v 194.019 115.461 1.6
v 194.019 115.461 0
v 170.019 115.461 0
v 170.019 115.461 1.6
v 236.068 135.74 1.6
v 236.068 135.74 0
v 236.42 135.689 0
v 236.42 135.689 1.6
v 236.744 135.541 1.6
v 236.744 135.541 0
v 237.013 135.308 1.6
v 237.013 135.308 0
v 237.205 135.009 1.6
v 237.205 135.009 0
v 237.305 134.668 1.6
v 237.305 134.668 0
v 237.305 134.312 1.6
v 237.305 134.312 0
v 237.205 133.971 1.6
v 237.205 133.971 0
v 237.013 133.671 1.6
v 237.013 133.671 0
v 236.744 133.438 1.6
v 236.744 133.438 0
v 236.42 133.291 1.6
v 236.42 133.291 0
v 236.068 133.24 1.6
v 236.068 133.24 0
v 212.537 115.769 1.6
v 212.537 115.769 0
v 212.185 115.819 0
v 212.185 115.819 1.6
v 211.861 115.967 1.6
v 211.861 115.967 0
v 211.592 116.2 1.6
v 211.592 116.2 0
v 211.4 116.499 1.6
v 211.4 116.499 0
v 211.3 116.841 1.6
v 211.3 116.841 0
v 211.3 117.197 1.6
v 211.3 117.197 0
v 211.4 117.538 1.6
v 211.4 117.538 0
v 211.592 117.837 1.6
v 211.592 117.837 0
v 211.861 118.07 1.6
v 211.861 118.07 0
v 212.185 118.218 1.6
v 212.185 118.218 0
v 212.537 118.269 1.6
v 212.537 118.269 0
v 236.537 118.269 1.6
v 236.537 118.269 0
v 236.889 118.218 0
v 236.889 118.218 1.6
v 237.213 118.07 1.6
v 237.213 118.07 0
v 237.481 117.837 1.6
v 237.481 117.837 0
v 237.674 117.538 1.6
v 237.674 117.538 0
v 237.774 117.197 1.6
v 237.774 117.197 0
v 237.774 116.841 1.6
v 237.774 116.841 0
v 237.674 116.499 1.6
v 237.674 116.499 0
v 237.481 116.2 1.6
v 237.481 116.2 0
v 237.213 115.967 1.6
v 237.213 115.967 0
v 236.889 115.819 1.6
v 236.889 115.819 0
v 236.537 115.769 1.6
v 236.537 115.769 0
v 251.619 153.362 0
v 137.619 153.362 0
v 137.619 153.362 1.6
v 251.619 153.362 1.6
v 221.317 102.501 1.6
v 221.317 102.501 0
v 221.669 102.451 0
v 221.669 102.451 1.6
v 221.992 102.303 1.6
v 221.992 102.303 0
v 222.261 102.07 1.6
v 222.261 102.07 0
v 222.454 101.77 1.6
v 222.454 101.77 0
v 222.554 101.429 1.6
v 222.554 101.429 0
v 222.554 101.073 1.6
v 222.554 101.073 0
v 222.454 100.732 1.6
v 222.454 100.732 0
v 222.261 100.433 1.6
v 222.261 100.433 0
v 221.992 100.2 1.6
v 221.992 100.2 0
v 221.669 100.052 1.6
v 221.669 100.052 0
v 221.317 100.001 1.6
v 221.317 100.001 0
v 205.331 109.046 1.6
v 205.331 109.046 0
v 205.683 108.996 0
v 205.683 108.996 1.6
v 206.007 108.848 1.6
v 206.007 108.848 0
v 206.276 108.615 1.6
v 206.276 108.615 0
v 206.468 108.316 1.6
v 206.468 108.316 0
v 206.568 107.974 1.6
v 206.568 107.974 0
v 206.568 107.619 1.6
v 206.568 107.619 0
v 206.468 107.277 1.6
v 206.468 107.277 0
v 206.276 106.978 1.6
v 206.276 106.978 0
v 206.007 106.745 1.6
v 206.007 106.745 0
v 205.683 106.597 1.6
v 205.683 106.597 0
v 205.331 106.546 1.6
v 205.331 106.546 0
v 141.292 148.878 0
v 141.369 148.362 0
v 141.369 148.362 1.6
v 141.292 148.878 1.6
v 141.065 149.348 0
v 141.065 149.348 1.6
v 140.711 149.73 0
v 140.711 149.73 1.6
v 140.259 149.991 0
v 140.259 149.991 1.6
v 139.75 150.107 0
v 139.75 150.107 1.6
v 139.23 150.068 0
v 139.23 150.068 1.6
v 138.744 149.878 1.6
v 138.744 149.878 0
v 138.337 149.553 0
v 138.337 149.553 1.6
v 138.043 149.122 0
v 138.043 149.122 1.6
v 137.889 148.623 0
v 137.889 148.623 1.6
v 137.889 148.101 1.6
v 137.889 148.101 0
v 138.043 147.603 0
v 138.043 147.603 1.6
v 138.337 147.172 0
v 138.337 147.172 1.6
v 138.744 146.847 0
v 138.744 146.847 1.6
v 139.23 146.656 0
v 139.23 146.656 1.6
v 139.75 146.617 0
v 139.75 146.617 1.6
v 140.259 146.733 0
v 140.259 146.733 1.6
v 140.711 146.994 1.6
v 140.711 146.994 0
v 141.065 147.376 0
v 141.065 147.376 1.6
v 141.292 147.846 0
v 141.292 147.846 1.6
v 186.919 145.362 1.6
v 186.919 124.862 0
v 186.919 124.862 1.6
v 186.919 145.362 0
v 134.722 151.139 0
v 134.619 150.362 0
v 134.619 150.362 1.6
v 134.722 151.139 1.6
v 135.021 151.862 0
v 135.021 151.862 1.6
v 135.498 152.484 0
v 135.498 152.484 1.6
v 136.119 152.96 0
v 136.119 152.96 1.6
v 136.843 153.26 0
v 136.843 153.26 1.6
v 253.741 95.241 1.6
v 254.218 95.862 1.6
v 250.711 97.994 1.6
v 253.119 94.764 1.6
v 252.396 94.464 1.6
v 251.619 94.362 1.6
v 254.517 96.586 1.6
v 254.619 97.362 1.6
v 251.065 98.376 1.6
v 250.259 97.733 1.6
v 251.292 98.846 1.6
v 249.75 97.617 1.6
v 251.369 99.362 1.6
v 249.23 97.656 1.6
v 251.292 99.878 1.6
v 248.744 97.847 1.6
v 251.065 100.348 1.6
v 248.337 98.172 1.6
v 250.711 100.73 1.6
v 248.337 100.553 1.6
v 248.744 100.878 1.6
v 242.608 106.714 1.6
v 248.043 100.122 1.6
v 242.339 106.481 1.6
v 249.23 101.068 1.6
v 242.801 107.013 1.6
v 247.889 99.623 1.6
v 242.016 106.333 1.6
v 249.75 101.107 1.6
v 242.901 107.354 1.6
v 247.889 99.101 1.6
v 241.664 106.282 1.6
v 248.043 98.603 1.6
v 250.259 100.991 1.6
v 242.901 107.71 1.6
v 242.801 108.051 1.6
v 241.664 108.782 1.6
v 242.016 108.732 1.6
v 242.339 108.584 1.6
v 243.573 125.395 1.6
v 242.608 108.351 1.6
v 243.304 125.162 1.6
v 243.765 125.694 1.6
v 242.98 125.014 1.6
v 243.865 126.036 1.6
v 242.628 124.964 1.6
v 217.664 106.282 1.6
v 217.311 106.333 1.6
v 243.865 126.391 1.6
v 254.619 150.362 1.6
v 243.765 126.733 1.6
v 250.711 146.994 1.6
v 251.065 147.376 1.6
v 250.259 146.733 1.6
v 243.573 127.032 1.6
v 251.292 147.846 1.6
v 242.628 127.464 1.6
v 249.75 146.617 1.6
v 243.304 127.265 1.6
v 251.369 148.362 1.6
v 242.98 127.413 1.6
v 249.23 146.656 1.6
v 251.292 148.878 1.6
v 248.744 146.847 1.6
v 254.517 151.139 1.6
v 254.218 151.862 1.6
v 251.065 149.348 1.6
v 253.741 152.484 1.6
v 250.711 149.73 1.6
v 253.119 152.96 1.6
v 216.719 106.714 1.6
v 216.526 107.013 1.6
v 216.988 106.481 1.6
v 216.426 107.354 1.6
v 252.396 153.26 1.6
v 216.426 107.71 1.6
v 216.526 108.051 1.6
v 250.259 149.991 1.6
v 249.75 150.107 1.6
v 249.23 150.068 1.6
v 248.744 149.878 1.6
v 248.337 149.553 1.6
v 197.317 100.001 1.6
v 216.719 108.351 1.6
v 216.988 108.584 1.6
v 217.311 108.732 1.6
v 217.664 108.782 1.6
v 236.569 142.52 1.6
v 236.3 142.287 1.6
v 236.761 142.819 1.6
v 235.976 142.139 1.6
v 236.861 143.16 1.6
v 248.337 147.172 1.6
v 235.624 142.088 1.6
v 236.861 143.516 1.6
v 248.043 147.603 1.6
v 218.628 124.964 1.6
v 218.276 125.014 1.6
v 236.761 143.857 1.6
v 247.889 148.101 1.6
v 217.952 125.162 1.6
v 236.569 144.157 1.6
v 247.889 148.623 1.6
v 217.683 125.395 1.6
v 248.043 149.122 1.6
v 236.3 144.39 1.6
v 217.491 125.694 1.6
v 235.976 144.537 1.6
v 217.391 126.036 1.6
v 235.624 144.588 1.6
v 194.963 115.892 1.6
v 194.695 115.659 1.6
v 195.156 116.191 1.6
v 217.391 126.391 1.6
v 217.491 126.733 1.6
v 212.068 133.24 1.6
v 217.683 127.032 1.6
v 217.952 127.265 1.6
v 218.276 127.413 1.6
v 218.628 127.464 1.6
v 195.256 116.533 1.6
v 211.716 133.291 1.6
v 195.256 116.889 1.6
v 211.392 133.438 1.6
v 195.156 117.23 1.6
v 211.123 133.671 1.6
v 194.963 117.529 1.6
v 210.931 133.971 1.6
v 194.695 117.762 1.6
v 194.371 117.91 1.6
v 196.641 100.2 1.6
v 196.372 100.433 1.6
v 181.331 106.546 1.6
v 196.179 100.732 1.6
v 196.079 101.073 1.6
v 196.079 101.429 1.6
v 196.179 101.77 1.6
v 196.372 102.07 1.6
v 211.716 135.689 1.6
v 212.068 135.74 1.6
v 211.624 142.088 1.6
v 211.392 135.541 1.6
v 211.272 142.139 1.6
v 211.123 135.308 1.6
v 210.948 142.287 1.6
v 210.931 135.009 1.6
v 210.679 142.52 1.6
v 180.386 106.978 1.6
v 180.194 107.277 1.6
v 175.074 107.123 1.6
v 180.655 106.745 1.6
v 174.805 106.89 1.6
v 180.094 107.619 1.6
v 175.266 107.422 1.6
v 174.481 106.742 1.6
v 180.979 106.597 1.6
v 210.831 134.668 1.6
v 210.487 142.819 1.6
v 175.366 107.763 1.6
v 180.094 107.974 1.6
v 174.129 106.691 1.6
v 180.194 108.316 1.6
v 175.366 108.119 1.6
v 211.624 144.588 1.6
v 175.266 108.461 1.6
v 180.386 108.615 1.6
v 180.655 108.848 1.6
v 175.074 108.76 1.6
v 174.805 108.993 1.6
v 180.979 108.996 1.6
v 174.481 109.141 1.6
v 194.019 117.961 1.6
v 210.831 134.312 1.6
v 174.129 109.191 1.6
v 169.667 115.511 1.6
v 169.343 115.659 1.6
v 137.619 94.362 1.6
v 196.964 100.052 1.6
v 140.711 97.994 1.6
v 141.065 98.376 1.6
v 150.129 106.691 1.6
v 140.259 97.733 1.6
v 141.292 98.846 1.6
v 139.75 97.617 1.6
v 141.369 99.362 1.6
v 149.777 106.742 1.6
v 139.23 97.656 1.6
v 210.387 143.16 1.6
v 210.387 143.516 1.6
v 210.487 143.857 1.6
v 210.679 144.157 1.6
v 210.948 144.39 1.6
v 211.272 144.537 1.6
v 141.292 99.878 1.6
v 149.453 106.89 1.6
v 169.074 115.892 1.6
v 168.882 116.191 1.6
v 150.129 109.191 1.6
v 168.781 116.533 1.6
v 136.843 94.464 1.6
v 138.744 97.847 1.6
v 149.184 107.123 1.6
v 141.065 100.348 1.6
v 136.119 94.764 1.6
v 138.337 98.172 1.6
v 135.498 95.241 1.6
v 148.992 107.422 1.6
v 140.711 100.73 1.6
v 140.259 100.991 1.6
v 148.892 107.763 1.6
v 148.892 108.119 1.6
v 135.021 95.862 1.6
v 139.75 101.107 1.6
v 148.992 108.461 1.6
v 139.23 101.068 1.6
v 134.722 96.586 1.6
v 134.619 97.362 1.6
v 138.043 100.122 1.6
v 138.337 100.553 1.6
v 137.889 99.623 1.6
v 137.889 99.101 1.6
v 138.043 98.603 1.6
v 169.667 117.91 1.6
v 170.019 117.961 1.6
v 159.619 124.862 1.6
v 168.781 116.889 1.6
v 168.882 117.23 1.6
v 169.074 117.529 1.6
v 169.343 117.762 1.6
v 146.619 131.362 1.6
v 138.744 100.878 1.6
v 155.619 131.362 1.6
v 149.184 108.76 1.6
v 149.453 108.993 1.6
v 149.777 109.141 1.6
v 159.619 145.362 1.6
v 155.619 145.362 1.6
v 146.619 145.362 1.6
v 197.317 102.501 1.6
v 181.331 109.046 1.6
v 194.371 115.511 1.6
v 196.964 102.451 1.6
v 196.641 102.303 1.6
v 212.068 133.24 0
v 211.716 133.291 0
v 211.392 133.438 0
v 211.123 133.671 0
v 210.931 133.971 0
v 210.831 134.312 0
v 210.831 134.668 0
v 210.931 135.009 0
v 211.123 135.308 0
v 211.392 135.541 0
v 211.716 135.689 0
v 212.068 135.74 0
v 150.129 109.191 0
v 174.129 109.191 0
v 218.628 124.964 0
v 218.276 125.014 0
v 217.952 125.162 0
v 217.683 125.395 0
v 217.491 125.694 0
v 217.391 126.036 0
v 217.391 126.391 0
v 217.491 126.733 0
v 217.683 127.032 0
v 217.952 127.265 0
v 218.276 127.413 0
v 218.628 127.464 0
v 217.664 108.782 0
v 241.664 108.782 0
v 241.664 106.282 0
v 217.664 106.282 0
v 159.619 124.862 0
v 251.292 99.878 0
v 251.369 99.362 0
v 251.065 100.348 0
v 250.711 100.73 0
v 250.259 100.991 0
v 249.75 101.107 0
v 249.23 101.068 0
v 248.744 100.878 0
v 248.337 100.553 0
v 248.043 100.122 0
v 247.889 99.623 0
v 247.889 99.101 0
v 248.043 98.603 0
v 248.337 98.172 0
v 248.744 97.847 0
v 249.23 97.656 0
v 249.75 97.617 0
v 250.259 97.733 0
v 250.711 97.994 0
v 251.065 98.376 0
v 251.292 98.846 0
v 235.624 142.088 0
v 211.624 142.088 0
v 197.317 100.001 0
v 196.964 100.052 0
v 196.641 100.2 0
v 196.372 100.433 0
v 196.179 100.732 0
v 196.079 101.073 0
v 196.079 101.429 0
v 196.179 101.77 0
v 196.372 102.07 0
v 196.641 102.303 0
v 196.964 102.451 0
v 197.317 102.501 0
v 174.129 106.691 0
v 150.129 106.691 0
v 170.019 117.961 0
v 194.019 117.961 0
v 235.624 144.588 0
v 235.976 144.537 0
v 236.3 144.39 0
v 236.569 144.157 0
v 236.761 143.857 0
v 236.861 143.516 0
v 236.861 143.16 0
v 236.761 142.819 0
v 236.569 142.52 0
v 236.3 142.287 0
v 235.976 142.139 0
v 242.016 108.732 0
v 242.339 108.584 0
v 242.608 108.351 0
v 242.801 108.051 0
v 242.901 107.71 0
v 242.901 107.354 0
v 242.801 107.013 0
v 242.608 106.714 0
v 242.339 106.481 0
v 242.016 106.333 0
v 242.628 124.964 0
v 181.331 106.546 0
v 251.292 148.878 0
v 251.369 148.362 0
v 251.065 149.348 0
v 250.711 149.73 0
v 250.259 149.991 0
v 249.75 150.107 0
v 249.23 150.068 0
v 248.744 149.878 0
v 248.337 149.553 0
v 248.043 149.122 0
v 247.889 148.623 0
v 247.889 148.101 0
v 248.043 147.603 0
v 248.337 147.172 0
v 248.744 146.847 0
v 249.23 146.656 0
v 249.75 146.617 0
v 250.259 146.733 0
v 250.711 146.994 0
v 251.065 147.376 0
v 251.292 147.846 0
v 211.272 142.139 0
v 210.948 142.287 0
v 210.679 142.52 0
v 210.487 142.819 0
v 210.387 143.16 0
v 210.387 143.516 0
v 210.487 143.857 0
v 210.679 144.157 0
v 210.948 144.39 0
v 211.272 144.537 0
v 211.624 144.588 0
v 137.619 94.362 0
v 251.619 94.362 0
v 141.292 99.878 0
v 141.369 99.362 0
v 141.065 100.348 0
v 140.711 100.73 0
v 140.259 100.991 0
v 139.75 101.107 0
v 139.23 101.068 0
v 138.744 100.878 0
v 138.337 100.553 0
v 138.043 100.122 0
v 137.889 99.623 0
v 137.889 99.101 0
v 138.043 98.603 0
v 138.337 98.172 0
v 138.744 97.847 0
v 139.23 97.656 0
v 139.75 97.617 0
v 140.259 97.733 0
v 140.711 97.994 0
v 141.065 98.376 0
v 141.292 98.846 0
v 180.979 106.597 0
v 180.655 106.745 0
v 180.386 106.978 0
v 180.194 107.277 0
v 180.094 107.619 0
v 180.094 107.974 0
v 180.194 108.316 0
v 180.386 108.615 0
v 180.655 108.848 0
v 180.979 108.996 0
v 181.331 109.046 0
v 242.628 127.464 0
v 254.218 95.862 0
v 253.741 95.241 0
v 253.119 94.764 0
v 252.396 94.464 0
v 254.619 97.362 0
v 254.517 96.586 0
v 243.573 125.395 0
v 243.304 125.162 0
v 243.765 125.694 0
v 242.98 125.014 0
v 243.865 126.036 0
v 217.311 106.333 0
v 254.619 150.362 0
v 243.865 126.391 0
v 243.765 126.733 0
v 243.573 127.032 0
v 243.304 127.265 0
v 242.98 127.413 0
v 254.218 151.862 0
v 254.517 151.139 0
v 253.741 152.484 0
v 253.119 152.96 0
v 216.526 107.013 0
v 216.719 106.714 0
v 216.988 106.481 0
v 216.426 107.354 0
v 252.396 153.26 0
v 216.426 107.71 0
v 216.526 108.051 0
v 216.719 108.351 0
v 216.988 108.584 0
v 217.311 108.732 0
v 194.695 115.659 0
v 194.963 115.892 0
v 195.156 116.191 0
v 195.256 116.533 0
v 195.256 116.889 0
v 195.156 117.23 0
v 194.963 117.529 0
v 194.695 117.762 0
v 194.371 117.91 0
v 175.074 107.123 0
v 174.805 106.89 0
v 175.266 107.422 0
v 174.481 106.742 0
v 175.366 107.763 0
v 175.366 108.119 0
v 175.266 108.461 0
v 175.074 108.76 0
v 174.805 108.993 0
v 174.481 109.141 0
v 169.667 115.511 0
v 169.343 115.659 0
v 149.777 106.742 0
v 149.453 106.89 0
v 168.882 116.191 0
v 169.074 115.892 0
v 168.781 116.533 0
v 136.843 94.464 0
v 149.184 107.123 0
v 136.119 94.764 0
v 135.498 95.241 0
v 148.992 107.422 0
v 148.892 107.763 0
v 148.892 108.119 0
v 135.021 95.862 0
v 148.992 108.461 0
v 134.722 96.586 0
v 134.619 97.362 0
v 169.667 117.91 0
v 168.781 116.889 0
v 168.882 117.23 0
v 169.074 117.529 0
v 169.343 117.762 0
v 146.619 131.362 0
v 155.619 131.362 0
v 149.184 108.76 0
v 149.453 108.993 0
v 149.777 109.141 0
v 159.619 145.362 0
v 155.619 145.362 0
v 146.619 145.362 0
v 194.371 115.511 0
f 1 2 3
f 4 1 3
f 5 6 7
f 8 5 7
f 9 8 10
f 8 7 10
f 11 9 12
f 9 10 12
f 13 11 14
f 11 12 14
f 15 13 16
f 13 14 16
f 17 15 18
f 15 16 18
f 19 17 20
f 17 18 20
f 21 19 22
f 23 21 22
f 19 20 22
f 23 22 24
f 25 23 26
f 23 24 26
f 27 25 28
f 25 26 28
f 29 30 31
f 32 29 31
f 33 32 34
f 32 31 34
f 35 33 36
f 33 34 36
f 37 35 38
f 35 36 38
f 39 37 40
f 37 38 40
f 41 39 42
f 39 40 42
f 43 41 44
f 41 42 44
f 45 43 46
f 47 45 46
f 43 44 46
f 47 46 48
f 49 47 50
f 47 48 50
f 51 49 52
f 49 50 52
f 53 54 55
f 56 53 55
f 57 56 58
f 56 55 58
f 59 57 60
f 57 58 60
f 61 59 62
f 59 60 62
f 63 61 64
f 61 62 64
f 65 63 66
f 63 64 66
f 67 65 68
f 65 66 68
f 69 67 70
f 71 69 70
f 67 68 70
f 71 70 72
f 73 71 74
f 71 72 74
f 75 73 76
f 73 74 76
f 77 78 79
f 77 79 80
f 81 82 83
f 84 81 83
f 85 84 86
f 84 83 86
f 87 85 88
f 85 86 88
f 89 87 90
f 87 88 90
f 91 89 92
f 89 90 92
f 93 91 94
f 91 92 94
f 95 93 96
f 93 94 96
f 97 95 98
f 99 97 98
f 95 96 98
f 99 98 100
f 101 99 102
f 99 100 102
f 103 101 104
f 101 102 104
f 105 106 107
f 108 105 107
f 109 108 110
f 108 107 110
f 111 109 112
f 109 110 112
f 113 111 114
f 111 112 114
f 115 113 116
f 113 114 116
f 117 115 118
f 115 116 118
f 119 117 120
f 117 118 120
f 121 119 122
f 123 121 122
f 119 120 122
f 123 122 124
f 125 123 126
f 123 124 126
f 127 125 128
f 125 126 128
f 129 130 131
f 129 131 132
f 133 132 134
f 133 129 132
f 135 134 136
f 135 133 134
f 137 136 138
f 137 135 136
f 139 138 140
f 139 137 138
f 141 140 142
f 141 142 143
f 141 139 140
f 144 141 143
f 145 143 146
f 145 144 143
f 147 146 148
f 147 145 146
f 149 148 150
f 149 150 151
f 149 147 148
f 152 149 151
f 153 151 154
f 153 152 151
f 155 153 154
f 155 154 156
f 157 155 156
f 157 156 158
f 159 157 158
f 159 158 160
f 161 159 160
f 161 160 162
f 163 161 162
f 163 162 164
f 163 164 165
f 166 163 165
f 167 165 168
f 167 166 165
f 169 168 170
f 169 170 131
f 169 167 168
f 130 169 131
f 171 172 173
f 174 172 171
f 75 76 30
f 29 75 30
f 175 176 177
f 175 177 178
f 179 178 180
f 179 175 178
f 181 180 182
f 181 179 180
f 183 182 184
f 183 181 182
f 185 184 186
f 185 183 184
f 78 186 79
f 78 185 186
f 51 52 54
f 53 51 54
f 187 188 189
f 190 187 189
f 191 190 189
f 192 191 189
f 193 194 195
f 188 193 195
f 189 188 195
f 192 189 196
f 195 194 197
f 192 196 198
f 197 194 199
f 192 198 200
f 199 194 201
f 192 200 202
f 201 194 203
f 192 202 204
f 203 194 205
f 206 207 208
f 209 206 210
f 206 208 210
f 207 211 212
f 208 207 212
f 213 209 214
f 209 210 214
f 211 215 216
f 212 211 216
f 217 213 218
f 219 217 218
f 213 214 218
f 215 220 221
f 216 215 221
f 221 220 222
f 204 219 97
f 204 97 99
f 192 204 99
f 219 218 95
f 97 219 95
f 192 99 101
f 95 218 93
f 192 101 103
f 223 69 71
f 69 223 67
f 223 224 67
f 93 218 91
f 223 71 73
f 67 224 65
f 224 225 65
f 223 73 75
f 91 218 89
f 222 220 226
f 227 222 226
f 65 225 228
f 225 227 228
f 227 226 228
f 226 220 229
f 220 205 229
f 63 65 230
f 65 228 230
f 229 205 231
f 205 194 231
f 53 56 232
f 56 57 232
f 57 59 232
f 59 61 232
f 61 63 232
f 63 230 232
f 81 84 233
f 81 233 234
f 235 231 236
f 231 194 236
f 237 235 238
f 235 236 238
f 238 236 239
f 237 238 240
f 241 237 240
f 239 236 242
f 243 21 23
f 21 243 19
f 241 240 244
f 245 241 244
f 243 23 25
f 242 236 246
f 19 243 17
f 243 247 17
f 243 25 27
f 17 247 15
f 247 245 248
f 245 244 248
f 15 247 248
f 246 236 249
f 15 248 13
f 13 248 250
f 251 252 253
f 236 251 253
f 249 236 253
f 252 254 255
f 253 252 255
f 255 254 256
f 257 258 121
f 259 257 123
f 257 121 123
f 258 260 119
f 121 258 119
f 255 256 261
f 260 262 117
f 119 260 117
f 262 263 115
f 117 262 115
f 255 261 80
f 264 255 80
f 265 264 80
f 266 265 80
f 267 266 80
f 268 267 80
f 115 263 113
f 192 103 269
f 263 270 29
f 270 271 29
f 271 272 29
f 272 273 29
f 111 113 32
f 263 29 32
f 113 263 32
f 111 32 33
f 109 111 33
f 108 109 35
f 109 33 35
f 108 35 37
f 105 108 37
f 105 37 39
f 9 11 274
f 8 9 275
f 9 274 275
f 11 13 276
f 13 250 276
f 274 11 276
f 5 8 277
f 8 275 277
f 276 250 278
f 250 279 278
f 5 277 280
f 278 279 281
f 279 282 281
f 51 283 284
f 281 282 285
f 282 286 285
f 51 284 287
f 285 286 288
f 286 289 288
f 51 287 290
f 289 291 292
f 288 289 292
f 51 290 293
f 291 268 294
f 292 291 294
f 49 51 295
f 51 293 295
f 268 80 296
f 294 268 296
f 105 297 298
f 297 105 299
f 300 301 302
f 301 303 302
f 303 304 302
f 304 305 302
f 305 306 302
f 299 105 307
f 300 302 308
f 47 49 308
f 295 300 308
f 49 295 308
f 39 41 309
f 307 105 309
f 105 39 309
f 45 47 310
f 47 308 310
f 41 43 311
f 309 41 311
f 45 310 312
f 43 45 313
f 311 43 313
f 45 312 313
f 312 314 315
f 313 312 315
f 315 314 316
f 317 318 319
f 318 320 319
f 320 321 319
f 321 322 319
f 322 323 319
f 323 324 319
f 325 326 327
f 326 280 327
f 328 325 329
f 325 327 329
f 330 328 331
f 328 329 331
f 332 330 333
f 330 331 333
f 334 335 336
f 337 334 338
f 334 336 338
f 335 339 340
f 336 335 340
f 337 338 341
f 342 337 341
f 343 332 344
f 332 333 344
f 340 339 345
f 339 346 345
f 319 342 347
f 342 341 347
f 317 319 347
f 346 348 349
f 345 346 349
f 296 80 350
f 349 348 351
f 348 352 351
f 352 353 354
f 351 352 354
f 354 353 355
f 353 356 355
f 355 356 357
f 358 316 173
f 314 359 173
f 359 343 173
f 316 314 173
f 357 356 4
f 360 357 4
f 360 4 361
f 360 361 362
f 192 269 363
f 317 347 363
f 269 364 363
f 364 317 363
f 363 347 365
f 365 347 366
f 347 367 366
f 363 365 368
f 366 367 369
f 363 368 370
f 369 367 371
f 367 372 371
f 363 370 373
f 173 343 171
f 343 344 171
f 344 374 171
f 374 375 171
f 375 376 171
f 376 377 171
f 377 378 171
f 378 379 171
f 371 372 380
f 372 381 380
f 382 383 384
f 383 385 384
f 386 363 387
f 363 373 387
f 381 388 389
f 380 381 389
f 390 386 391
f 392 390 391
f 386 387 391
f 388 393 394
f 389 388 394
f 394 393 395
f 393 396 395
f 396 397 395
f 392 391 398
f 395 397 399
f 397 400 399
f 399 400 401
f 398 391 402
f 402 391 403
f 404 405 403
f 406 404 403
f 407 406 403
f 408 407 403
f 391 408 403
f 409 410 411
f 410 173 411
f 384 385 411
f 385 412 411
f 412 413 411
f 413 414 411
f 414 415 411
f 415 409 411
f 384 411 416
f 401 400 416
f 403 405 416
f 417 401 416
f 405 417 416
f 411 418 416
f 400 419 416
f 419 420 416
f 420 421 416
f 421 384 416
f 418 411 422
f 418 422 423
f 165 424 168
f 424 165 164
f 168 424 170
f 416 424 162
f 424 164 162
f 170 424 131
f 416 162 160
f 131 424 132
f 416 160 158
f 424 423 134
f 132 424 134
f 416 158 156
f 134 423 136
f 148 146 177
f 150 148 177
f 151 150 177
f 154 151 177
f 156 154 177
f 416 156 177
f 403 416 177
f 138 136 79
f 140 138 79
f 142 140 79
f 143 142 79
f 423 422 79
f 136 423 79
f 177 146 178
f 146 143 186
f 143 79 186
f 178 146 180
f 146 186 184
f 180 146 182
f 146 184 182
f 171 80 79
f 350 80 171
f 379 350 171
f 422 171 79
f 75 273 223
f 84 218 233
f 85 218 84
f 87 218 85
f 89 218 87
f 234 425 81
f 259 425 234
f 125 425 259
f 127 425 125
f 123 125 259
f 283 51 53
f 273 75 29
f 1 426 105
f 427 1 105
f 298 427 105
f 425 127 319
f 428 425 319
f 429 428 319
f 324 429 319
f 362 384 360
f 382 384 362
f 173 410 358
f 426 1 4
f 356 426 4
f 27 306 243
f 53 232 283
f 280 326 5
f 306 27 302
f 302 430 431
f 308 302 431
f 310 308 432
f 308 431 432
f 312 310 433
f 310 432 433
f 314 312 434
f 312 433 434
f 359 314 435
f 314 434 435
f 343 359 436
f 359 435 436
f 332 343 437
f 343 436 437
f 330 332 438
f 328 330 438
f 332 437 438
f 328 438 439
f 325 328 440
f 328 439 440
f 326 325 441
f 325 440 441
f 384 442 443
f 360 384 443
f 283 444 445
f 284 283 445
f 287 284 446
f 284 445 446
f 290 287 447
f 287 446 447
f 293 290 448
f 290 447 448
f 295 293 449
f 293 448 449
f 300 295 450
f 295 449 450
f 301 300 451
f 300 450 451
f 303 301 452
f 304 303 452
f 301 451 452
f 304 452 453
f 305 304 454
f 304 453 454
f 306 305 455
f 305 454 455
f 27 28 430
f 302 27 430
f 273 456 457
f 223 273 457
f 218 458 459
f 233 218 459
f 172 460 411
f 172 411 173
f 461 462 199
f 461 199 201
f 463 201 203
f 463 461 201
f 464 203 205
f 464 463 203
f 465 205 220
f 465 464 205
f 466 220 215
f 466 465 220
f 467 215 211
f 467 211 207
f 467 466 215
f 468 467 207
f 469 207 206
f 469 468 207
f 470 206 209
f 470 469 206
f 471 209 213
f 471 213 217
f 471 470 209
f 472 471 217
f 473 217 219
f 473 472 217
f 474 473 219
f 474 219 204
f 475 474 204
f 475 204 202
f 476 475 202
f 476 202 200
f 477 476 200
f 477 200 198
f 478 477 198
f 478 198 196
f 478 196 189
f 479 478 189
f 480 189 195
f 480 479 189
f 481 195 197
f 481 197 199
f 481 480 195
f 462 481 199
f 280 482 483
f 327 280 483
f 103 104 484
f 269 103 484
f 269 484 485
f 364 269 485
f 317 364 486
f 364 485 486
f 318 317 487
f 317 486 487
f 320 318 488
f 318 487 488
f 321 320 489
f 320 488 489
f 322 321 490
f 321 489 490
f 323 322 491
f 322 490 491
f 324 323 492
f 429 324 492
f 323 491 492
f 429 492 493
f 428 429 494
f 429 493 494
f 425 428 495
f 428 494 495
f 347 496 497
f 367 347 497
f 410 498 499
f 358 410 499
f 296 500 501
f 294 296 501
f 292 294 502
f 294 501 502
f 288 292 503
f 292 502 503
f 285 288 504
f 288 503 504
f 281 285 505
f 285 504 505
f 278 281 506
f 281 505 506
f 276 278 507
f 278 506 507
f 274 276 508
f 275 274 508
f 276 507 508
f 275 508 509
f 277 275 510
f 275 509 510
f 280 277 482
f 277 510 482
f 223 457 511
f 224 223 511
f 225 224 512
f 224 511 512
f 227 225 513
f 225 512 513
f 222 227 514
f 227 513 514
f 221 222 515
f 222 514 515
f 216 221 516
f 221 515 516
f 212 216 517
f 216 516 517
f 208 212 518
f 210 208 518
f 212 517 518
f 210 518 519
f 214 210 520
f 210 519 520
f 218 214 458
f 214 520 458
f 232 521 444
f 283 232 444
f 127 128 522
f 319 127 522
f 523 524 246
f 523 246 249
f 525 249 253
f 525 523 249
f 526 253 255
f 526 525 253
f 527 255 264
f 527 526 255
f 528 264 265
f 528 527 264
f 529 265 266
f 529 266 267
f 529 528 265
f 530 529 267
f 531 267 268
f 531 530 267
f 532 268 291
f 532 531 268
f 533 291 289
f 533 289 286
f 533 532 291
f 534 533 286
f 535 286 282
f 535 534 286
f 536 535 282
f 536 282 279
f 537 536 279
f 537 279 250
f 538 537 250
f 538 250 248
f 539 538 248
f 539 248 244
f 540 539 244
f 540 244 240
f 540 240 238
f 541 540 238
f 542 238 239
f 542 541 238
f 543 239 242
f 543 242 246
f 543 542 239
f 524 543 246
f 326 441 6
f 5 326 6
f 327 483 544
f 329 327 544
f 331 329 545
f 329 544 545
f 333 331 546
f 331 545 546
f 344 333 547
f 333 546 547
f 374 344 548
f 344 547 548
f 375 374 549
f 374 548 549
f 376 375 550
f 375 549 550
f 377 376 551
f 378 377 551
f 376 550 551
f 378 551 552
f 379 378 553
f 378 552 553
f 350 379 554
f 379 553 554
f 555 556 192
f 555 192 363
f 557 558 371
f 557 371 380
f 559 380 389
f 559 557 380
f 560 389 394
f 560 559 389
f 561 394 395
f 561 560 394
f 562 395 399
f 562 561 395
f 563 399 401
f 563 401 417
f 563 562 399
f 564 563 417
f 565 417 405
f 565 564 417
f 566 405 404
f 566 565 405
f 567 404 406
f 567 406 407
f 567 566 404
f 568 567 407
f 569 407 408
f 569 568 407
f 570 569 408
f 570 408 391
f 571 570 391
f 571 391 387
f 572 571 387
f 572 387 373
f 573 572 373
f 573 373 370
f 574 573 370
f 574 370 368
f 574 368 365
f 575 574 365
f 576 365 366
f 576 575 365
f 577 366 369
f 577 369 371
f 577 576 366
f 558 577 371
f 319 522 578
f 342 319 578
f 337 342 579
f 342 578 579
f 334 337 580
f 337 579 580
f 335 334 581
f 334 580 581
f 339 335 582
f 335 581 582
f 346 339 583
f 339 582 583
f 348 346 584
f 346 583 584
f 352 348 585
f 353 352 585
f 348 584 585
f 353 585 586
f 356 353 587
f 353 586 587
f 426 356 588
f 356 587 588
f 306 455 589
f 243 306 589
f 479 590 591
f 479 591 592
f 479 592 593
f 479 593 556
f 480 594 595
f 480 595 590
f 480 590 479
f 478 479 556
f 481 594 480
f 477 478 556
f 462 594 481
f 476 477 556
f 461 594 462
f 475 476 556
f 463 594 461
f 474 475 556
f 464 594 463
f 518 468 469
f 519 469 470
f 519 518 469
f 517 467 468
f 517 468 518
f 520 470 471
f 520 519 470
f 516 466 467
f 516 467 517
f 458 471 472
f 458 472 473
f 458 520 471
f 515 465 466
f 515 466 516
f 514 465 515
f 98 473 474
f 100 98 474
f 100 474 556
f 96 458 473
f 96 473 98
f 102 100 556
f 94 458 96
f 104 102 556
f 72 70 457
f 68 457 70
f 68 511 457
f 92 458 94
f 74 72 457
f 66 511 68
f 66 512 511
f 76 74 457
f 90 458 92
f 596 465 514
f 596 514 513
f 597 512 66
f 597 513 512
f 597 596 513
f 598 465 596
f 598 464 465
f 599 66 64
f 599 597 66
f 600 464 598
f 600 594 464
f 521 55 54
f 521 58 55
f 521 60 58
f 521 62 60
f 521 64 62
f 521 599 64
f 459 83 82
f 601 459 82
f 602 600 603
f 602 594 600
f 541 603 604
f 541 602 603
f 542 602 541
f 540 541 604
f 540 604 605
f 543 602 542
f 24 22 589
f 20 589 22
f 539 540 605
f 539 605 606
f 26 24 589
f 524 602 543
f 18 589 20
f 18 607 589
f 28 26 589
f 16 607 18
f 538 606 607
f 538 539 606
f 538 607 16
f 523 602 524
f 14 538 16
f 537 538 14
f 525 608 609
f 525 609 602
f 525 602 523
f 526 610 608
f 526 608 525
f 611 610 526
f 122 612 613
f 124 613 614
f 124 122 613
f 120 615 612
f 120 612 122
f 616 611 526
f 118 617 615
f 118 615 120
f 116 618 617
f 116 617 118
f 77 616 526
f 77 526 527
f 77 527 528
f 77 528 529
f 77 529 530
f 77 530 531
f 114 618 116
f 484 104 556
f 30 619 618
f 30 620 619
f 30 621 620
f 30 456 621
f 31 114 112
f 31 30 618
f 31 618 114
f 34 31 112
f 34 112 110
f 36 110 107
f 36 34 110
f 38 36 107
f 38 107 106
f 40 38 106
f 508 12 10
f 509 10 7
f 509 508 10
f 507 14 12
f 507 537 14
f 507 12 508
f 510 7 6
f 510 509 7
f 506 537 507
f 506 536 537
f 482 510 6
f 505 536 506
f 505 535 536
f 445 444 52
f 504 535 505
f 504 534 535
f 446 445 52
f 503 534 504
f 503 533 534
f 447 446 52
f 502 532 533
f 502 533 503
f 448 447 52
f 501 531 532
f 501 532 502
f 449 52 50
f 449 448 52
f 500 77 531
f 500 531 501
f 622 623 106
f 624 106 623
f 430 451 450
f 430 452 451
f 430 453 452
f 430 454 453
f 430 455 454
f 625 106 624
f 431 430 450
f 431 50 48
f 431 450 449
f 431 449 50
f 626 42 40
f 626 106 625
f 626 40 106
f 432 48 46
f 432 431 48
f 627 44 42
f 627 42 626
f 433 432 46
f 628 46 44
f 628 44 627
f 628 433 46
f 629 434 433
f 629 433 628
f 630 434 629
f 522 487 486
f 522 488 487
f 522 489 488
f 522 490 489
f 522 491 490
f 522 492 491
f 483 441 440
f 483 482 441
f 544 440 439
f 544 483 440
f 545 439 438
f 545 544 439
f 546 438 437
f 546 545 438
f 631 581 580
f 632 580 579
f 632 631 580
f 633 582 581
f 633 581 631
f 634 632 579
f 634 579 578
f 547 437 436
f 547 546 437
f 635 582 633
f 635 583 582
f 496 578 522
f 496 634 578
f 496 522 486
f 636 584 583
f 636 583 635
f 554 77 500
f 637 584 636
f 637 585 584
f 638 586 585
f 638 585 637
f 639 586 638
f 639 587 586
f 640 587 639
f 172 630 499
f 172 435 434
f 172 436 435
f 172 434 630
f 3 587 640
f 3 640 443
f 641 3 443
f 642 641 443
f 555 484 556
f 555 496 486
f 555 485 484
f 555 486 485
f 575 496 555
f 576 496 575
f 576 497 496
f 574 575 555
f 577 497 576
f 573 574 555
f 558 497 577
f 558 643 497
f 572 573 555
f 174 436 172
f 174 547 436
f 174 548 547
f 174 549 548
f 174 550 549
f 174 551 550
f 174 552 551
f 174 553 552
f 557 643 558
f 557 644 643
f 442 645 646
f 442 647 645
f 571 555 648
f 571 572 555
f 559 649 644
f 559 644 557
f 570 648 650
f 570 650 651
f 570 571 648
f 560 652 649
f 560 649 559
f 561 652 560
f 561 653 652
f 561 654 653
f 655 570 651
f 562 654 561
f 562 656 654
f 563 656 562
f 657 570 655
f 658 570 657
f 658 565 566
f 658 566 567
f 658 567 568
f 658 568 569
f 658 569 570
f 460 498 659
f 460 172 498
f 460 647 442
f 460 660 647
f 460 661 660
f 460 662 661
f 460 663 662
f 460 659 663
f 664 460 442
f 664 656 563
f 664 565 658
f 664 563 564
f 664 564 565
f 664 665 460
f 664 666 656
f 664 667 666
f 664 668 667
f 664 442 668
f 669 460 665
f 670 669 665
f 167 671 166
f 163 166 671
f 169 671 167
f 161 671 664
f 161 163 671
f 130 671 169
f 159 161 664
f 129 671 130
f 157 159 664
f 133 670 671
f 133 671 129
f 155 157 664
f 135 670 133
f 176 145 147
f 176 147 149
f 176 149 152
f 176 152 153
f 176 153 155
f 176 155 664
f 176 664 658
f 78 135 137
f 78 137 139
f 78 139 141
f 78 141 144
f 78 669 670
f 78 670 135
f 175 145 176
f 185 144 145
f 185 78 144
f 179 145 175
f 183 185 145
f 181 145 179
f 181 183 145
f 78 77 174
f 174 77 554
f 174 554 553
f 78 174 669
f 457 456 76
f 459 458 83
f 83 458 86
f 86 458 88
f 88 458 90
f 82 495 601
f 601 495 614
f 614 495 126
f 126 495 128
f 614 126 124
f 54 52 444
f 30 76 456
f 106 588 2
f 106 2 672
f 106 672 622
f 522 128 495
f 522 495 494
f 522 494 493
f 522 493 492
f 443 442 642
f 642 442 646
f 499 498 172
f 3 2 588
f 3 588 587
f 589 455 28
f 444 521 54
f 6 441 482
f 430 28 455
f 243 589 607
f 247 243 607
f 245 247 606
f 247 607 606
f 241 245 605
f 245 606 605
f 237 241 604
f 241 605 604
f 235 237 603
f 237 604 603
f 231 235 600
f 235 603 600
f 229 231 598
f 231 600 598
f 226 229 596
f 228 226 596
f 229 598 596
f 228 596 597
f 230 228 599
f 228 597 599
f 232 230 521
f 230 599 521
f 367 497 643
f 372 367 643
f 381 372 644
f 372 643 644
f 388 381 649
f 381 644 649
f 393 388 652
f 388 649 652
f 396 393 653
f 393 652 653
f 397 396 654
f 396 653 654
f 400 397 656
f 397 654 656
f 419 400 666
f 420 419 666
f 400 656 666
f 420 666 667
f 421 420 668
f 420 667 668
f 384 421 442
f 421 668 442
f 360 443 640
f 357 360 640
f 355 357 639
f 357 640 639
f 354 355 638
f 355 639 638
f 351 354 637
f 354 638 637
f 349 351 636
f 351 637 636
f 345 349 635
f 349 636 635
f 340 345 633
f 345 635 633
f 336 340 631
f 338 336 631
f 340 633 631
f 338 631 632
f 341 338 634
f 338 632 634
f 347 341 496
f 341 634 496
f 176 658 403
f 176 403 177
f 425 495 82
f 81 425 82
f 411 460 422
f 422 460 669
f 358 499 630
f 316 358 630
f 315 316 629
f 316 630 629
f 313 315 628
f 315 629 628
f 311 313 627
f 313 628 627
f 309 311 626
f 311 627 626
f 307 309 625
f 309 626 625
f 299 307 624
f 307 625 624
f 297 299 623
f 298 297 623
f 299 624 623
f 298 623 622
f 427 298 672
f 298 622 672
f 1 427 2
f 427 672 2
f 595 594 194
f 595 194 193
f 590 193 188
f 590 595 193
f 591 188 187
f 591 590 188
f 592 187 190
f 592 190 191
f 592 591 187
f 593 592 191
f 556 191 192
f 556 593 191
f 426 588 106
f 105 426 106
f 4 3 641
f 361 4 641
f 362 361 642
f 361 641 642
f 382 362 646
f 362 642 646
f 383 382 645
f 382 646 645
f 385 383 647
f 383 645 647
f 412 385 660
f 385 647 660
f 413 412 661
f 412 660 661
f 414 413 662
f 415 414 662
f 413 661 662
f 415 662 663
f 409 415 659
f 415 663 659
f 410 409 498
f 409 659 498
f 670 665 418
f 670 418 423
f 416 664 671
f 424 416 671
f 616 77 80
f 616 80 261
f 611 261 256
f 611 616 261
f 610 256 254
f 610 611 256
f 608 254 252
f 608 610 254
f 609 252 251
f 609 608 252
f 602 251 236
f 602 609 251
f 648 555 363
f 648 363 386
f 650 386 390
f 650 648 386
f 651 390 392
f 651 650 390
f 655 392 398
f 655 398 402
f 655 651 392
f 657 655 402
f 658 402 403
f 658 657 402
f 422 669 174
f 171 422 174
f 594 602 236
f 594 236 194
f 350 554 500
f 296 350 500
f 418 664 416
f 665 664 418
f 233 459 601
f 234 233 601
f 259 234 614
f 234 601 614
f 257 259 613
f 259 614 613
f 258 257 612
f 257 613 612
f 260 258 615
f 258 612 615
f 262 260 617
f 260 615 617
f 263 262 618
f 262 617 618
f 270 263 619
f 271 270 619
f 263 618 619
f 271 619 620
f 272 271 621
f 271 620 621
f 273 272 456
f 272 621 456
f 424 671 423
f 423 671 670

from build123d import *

# Parameters (mm, degrees)
SKETCH_2_R      = 1.75
SKETCH_2_W      = 27.3
SKETCH_2_H      = 20.5
SKETCH_2_W_2    = 9
SKETCH_2_H_2    = 14
EXTRUDE_1_DEPTH = 1.6


with BuildPart() as part:
    # 草图2 → 凸台-拉伸1 (new body)
    with BuildSketch(Plane.XY):
        with BuildLine():
            Line((137.6194709, 153.362234659), (251.6194709, 153.362234659))
            ThreePointArc((251.6194709, 153.362234659), (253.740791244, 152.483555002), (254.6194709, 150.362234659))
            Line((254.6194709, 150.362234659), (254.6194709, 97.362234659))
            ThreePointArc((254.6194709, 97.362234659), (253.740791244, 95.240914315), (251.6194709, 94.362234659))
            Line((251.6194709, 94.362234659), (137.6194709, 94.362234659))
            ThreePointArc((137.6194709, 94.362234659), (135.498150556, 95.240914315), (134.6194709, 97.362234659))
            Line((134.6194709, 97.362234659), (134.6194709, 150.362234659))
            ThreePointArc((134.6194709, 150.362234659), (135.498150556, 152.483555002), (137.6194709, 153.362234659))
        make_face()
        with Locations((139.6194709, 99.362234659)):
            Circle(SKETCH_2_R, mode=Mode.SUBTRACT)
        with Locations((249.6194709, 99.362234659)):
            Circle(SKETCH_2_R, mode=Mode.SUBTRACT)
        with Locations((249.6194709, 148.362234659)):
            Circle(SKETCH_2_R, mode=Mode.SUBTRACT)
        with Locations((139.6194709, 148.362234659)):
            Circle(SKETCH_2_R, mode=Mode.SUBTRACT)
        with Locations((173.2694709, 135.112234659)):
            Rectangle(SKETCH_2_W, SKETCH_2_H, mode=Mode.SUBTRACT)
        with BuildLine():
            Line((211.624069471, 144.588100568), (235.624069471, 144.588100568))
            ThreePointArc((235.624069471, 144.588100568), (236.874069471, 143.338100568), (235.624069471, 142.088100568))
            Line((235.624069471, 142.088100568), (211.624069471, 142.088100568))
            ThreePointArc((211.624069471, 142.088100568), (210.374069471, 143.338100568), (211.624069471, 144.588100568))
        make_face(mode=Mode.SUBTRACT)
        with BuildLine():
            Line((212.067868177, 135.739898553), (236.067868177, 135.739898553))
            ThreePointArc((236.067868177, 135.739898553), (237.317868177, 134.489898553), (236.067868177, 133.239898553))
            Line((236.067868177, 133.239898553), (212.067868177, 133.239898553))
            ThreePointArc((212.067868177, 133.239898553), (210.817868177, 134.489898553), (212.067868177, 135.739898553))
        make_face(mode=Mode.SUBTRACT)
        with BuildLine():
            Line((212.536781854, 118.268660205), (236.536781854, 118.268660205))
            ThreePointArc((236.536781854, 118.268660205), (237.786781854, 117.018660205), (236.536781854, 115.768660205))
            Line((236.536781854, 115.768660205), (212.536781854, 115.768660205))
            ThreePointArc((212.536781854, 115.768660205), (211.286781854, 117.018660205), (212.536781854, 118.268660205))
        make_face(mode=Mode.SUBTRACT)
        with BuildLine():
            Line((150.12910228, 109.191368081), (174.12910228, 109.191368081))
            ThreePointArc((174.12910228, 109.191368081), (175.37910228, 107.941368081), (174.12910228, 106.691368081))
            Line((174.12910228, 106.691368081), (150.12910228, 106.691368081))
            ThreePointArc((150.12910228, 106.691368081), (148.87910228, 107.941368081), (150.12910228, 109.191368081))
        make_face(mode=Mode.SUBTRACT)
        with BuildLine():
            Line((181.33094074, 109.046397883), (205.33094074, 109.046397883))
            ThreePointArc((205.33094074, 109.046397883), (206.58094074, 107.796397883), (205.33094074, 106.546397883))
            Line((205.33094074, 106.546397883), (181.33094074, 106.546397883))
            ThreePointArc((181.33094074, 106.546397883), (180.08094074, 107.796397883), (181.33094074, 109.046397883))
        make_face(mode=Mode.SUBTRACT)
        with BuildLine():
            Line((217.663513674, 108.782143694), (241.663513674, 108.782143694))
            ThreePointArc((241.663513674, 108.782143694), (242.913513674, 107.532143694), (241.663513674, 106.282143694))
            Line((241.663513674, 106.282143694), (217.663513674, 106.282143694))
            ThreePointArc((217.663513674, 106.282143694), (216.413513674, 107.532143694), (217.663513674, 108.782143694))
        make_face(mode=Mode.SUBTRACT)
        with BuildLine():
            Line((218.628069565, 127.463512498), (242.628069565, 127.463512498))
            ThreePointArc((242.628069565, 127.463512498), (243.878069565, 126.213512498), (242.628069565, 124.963512498))
            Line((242.628069565, 124.963512498), (218.628069565, 124.963512498))
            ThreePointArc((218.628069565, 124.963512498), (217.378069565, 126.213512498), (218.628069565, 127.463512498))
        make_face(mode=Mode.SUBTRACT)
        with BuildLine():
            Line((170.018702634, 117.960710868), (194.018702634, 117.960710868))
            ThreePointArc((194.018702634, 117.960710868), (195.268702634, 116.710710868), (194.018702634, 115.460710868))
            Line((194.018702634, 115.460710868), (170.018702634, 115.460710868))
            ThreePointArc((170.018702634, 115.460710868), (168.768702634, 116.710710868), (170.018702634, 117.960710868))
        make_face(mode=Mode.SUBTRACT)
        with BuildLine():
            Line((197.316536613, 102.501223257), (221.316536613, 102.501223257))
            ThreePointArc((221.316536613, 102.501223257), (222.566536613, 101.251223257), (221.316536613, 100.001223257))
            Line((221.316536613, 100.001223257), (197.316536613, 100.001223257))
            ThreePointArc((197.316536613, 100.001223257), (196.066536613, 101.251223257), (197.316536613, 102.501223257))
        make_face(mode=Mode.SUBTRACT)
        with Locations((151.1194709, 138.362234659)):
            Rectangle(SKETCH_2_W_2, SKETCH_2_H_2, mode=Mode.SUBTRACT)
    extrude(amount=EXTRUDE_1_DEPTH)


solid = part.part
